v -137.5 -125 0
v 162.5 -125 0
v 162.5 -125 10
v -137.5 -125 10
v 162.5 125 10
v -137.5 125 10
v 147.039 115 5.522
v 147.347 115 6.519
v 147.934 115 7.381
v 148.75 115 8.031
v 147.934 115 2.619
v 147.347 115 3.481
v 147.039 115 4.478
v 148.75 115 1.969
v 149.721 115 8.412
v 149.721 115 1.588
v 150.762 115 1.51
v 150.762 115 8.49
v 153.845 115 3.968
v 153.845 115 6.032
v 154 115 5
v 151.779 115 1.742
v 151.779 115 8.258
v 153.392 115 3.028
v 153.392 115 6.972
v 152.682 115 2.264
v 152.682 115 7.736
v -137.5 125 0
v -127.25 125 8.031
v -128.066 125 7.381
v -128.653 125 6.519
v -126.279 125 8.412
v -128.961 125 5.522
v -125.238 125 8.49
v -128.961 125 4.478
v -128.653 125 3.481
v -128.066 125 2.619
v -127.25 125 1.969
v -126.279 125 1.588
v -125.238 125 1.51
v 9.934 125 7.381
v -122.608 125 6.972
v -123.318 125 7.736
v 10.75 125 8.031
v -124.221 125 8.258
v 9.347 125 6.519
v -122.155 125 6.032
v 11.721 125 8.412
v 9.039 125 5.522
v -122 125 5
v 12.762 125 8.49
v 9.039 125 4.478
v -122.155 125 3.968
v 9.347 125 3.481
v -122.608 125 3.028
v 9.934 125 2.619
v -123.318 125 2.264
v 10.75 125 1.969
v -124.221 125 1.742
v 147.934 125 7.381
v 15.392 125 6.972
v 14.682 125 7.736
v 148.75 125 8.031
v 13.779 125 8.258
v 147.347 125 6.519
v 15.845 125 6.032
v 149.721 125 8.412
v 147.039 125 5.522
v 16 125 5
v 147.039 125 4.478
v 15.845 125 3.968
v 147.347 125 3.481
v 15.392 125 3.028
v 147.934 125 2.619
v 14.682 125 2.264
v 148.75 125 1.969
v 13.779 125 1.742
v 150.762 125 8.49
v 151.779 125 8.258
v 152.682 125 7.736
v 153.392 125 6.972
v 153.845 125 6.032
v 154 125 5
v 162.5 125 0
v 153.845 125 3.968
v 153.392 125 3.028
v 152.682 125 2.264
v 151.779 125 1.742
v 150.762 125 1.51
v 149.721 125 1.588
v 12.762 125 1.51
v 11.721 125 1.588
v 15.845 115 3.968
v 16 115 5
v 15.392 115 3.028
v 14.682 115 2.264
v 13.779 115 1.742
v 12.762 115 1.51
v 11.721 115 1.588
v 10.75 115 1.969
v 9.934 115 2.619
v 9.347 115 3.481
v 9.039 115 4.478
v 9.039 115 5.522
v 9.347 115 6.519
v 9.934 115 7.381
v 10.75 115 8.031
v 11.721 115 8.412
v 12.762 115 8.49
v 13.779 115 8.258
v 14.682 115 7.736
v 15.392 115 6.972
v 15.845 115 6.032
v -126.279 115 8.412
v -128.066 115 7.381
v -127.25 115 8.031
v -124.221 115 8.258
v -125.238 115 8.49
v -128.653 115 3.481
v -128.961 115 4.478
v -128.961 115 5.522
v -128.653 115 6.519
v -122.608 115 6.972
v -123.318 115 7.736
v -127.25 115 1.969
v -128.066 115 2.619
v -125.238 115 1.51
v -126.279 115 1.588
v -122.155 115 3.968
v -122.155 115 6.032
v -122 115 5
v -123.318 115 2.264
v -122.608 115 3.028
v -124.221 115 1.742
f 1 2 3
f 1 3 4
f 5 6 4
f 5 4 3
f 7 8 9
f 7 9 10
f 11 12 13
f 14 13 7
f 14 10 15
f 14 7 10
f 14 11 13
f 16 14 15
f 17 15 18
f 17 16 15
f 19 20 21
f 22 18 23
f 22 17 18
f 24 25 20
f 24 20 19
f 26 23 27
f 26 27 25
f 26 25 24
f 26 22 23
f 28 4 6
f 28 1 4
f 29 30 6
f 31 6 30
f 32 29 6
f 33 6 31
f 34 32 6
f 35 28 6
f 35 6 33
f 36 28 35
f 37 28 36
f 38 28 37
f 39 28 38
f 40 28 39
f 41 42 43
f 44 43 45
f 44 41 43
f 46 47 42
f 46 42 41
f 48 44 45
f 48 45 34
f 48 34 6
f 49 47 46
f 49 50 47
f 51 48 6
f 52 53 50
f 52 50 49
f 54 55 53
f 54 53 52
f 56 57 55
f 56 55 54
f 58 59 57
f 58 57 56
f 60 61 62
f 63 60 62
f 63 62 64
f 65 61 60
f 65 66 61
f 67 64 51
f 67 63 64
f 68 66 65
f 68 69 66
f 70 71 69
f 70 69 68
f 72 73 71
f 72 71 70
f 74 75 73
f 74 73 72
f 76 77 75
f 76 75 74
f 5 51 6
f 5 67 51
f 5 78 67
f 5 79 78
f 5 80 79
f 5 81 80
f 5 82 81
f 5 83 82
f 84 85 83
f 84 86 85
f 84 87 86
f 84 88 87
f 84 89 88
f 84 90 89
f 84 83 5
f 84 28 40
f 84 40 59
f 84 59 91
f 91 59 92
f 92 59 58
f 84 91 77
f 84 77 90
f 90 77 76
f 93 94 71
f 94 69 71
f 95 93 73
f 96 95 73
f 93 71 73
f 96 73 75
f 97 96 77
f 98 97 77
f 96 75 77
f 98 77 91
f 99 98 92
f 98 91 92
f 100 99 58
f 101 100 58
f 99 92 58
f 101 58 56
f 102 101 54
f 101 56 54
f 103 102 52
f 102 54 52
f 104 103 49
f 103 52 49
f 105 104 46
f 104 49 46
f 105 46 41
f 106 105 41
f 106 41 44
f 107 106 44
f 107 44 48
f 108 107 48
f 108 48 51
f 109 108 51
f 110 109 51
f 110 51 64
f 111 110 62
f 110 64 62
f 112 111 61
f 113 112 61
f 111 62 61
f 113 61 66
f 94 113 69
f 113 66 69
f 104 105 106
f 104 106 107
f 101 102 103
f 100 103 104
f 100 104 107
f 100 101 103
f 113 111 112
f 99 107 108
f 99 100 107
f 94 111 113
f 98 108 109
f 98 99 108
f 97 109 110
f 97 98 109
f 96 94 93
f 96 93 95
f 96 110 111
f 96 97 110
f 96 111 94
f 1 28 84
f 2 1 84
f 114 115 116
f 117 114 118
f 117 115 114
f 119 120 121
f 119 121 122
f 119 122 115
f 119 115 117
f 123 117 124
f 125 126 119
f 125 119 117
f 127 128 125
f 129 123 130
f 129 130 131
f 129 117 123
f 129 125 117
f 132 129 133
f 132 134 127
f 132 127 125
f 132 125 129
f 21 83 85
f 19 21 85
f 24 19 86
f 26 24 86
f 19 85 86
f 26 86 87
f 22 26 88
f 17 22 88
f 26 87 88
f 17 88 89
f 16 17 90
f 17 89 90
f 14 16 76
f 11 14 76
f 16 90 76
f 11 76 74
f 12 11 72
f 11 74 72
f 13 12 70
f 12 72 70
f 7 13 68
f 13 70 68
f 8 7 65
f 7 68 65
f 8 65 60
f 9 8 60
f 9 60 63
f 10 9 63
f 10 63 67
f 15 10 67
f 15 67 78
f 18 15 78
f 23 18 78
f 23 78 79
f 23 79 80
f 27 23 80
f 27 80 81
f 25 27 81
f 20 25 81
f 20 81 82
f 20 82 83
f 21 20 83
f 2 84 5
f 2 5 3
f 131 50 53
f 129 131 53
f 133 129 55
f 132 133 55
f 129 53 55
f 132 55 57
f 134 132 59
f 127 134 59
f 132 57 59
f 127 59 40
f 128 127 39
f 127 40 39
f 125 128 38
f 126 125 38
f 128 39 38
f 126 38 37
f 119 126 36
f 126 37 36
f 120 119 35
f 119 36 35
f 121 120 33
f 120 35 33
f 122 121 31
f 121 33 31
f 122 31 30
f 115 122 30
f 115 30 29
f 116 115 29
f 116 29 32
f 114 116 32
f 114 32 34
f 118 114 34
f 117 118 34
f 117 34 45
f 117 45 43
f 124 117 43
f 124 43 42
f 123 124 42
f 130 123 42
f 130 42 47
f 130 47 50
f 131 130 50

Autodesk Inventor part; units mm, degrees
ref_plane "YZ Plane" through (0, 0, 0) normal (1, 0, 0) x (0, 1, 0)
ref_plane "XZ Plane" through (0, 0, 0) normal (0, 1, 0) x (-1, 0, 0)
ref_plane "XY Plane" through (0, 0, 0) normal (0, 0, 1) x (1, 0, 0)
sketch "Sketch1" plane through (0, 0, 0) normal (0, 0, 1) x (1, 0, 0)
  line L0 (-137.5, 125) -> (162.5, 125)
  line L1 (162.5, 125) -> (162.5, -125)
  line L2 (162.5, -125) -> (-137.5, -125)
  line L3 (-137.5, -125) -> (-137.5, 125)
  point P0 (0, 0)
  dimension "d0" = 300
  dimension "d1" = 250
  dimension "d2" = 162.5
  dimension "d3" = 125
extrude "Extrusion1" add sketch "Sketch1" along normal blind 10
sketch "Sketch4" plane through (-137.5, 125, 0) normal (0, 1, 0) x (1, 0, 0)
  circle A0 centre (288, -5) radius 3.5
  circle A1 centre (150, -5) radius 3.5
  circle A2 centre (12, -5) radius 3.5
  line L0 (300, 0) -> (300, -10) projected
  line L1 (0, 0) -> (0, -10) projected
  line L2 (0, 0) -> (300, 0) projected
  point P0 (137.5, 0)
  dimension "d6" = 7
  dimension "d7" = 7
  dimension "d8" = 7
  dimension "d9" = 12
  dimension "d10" = 12
  dimension "d12" = 150
  dimension "d13" = 5
  dimension "d14" = 5
  dimension "d15" = 5
extrude "Extrusion2" cut sketch "Sketch4" against normal blind 10
thread "Thread1" size "M7x1" class "6H" standard "ANSI Metric M Profile" full length
thread "Thread2" size "M7x1" class "6H" standard "ANSI Metric M Profile" full length
thread "Thread3" size "M7x1" class "6H" standard "ANSI Metric M Profile" full length
properties part number "Base"
